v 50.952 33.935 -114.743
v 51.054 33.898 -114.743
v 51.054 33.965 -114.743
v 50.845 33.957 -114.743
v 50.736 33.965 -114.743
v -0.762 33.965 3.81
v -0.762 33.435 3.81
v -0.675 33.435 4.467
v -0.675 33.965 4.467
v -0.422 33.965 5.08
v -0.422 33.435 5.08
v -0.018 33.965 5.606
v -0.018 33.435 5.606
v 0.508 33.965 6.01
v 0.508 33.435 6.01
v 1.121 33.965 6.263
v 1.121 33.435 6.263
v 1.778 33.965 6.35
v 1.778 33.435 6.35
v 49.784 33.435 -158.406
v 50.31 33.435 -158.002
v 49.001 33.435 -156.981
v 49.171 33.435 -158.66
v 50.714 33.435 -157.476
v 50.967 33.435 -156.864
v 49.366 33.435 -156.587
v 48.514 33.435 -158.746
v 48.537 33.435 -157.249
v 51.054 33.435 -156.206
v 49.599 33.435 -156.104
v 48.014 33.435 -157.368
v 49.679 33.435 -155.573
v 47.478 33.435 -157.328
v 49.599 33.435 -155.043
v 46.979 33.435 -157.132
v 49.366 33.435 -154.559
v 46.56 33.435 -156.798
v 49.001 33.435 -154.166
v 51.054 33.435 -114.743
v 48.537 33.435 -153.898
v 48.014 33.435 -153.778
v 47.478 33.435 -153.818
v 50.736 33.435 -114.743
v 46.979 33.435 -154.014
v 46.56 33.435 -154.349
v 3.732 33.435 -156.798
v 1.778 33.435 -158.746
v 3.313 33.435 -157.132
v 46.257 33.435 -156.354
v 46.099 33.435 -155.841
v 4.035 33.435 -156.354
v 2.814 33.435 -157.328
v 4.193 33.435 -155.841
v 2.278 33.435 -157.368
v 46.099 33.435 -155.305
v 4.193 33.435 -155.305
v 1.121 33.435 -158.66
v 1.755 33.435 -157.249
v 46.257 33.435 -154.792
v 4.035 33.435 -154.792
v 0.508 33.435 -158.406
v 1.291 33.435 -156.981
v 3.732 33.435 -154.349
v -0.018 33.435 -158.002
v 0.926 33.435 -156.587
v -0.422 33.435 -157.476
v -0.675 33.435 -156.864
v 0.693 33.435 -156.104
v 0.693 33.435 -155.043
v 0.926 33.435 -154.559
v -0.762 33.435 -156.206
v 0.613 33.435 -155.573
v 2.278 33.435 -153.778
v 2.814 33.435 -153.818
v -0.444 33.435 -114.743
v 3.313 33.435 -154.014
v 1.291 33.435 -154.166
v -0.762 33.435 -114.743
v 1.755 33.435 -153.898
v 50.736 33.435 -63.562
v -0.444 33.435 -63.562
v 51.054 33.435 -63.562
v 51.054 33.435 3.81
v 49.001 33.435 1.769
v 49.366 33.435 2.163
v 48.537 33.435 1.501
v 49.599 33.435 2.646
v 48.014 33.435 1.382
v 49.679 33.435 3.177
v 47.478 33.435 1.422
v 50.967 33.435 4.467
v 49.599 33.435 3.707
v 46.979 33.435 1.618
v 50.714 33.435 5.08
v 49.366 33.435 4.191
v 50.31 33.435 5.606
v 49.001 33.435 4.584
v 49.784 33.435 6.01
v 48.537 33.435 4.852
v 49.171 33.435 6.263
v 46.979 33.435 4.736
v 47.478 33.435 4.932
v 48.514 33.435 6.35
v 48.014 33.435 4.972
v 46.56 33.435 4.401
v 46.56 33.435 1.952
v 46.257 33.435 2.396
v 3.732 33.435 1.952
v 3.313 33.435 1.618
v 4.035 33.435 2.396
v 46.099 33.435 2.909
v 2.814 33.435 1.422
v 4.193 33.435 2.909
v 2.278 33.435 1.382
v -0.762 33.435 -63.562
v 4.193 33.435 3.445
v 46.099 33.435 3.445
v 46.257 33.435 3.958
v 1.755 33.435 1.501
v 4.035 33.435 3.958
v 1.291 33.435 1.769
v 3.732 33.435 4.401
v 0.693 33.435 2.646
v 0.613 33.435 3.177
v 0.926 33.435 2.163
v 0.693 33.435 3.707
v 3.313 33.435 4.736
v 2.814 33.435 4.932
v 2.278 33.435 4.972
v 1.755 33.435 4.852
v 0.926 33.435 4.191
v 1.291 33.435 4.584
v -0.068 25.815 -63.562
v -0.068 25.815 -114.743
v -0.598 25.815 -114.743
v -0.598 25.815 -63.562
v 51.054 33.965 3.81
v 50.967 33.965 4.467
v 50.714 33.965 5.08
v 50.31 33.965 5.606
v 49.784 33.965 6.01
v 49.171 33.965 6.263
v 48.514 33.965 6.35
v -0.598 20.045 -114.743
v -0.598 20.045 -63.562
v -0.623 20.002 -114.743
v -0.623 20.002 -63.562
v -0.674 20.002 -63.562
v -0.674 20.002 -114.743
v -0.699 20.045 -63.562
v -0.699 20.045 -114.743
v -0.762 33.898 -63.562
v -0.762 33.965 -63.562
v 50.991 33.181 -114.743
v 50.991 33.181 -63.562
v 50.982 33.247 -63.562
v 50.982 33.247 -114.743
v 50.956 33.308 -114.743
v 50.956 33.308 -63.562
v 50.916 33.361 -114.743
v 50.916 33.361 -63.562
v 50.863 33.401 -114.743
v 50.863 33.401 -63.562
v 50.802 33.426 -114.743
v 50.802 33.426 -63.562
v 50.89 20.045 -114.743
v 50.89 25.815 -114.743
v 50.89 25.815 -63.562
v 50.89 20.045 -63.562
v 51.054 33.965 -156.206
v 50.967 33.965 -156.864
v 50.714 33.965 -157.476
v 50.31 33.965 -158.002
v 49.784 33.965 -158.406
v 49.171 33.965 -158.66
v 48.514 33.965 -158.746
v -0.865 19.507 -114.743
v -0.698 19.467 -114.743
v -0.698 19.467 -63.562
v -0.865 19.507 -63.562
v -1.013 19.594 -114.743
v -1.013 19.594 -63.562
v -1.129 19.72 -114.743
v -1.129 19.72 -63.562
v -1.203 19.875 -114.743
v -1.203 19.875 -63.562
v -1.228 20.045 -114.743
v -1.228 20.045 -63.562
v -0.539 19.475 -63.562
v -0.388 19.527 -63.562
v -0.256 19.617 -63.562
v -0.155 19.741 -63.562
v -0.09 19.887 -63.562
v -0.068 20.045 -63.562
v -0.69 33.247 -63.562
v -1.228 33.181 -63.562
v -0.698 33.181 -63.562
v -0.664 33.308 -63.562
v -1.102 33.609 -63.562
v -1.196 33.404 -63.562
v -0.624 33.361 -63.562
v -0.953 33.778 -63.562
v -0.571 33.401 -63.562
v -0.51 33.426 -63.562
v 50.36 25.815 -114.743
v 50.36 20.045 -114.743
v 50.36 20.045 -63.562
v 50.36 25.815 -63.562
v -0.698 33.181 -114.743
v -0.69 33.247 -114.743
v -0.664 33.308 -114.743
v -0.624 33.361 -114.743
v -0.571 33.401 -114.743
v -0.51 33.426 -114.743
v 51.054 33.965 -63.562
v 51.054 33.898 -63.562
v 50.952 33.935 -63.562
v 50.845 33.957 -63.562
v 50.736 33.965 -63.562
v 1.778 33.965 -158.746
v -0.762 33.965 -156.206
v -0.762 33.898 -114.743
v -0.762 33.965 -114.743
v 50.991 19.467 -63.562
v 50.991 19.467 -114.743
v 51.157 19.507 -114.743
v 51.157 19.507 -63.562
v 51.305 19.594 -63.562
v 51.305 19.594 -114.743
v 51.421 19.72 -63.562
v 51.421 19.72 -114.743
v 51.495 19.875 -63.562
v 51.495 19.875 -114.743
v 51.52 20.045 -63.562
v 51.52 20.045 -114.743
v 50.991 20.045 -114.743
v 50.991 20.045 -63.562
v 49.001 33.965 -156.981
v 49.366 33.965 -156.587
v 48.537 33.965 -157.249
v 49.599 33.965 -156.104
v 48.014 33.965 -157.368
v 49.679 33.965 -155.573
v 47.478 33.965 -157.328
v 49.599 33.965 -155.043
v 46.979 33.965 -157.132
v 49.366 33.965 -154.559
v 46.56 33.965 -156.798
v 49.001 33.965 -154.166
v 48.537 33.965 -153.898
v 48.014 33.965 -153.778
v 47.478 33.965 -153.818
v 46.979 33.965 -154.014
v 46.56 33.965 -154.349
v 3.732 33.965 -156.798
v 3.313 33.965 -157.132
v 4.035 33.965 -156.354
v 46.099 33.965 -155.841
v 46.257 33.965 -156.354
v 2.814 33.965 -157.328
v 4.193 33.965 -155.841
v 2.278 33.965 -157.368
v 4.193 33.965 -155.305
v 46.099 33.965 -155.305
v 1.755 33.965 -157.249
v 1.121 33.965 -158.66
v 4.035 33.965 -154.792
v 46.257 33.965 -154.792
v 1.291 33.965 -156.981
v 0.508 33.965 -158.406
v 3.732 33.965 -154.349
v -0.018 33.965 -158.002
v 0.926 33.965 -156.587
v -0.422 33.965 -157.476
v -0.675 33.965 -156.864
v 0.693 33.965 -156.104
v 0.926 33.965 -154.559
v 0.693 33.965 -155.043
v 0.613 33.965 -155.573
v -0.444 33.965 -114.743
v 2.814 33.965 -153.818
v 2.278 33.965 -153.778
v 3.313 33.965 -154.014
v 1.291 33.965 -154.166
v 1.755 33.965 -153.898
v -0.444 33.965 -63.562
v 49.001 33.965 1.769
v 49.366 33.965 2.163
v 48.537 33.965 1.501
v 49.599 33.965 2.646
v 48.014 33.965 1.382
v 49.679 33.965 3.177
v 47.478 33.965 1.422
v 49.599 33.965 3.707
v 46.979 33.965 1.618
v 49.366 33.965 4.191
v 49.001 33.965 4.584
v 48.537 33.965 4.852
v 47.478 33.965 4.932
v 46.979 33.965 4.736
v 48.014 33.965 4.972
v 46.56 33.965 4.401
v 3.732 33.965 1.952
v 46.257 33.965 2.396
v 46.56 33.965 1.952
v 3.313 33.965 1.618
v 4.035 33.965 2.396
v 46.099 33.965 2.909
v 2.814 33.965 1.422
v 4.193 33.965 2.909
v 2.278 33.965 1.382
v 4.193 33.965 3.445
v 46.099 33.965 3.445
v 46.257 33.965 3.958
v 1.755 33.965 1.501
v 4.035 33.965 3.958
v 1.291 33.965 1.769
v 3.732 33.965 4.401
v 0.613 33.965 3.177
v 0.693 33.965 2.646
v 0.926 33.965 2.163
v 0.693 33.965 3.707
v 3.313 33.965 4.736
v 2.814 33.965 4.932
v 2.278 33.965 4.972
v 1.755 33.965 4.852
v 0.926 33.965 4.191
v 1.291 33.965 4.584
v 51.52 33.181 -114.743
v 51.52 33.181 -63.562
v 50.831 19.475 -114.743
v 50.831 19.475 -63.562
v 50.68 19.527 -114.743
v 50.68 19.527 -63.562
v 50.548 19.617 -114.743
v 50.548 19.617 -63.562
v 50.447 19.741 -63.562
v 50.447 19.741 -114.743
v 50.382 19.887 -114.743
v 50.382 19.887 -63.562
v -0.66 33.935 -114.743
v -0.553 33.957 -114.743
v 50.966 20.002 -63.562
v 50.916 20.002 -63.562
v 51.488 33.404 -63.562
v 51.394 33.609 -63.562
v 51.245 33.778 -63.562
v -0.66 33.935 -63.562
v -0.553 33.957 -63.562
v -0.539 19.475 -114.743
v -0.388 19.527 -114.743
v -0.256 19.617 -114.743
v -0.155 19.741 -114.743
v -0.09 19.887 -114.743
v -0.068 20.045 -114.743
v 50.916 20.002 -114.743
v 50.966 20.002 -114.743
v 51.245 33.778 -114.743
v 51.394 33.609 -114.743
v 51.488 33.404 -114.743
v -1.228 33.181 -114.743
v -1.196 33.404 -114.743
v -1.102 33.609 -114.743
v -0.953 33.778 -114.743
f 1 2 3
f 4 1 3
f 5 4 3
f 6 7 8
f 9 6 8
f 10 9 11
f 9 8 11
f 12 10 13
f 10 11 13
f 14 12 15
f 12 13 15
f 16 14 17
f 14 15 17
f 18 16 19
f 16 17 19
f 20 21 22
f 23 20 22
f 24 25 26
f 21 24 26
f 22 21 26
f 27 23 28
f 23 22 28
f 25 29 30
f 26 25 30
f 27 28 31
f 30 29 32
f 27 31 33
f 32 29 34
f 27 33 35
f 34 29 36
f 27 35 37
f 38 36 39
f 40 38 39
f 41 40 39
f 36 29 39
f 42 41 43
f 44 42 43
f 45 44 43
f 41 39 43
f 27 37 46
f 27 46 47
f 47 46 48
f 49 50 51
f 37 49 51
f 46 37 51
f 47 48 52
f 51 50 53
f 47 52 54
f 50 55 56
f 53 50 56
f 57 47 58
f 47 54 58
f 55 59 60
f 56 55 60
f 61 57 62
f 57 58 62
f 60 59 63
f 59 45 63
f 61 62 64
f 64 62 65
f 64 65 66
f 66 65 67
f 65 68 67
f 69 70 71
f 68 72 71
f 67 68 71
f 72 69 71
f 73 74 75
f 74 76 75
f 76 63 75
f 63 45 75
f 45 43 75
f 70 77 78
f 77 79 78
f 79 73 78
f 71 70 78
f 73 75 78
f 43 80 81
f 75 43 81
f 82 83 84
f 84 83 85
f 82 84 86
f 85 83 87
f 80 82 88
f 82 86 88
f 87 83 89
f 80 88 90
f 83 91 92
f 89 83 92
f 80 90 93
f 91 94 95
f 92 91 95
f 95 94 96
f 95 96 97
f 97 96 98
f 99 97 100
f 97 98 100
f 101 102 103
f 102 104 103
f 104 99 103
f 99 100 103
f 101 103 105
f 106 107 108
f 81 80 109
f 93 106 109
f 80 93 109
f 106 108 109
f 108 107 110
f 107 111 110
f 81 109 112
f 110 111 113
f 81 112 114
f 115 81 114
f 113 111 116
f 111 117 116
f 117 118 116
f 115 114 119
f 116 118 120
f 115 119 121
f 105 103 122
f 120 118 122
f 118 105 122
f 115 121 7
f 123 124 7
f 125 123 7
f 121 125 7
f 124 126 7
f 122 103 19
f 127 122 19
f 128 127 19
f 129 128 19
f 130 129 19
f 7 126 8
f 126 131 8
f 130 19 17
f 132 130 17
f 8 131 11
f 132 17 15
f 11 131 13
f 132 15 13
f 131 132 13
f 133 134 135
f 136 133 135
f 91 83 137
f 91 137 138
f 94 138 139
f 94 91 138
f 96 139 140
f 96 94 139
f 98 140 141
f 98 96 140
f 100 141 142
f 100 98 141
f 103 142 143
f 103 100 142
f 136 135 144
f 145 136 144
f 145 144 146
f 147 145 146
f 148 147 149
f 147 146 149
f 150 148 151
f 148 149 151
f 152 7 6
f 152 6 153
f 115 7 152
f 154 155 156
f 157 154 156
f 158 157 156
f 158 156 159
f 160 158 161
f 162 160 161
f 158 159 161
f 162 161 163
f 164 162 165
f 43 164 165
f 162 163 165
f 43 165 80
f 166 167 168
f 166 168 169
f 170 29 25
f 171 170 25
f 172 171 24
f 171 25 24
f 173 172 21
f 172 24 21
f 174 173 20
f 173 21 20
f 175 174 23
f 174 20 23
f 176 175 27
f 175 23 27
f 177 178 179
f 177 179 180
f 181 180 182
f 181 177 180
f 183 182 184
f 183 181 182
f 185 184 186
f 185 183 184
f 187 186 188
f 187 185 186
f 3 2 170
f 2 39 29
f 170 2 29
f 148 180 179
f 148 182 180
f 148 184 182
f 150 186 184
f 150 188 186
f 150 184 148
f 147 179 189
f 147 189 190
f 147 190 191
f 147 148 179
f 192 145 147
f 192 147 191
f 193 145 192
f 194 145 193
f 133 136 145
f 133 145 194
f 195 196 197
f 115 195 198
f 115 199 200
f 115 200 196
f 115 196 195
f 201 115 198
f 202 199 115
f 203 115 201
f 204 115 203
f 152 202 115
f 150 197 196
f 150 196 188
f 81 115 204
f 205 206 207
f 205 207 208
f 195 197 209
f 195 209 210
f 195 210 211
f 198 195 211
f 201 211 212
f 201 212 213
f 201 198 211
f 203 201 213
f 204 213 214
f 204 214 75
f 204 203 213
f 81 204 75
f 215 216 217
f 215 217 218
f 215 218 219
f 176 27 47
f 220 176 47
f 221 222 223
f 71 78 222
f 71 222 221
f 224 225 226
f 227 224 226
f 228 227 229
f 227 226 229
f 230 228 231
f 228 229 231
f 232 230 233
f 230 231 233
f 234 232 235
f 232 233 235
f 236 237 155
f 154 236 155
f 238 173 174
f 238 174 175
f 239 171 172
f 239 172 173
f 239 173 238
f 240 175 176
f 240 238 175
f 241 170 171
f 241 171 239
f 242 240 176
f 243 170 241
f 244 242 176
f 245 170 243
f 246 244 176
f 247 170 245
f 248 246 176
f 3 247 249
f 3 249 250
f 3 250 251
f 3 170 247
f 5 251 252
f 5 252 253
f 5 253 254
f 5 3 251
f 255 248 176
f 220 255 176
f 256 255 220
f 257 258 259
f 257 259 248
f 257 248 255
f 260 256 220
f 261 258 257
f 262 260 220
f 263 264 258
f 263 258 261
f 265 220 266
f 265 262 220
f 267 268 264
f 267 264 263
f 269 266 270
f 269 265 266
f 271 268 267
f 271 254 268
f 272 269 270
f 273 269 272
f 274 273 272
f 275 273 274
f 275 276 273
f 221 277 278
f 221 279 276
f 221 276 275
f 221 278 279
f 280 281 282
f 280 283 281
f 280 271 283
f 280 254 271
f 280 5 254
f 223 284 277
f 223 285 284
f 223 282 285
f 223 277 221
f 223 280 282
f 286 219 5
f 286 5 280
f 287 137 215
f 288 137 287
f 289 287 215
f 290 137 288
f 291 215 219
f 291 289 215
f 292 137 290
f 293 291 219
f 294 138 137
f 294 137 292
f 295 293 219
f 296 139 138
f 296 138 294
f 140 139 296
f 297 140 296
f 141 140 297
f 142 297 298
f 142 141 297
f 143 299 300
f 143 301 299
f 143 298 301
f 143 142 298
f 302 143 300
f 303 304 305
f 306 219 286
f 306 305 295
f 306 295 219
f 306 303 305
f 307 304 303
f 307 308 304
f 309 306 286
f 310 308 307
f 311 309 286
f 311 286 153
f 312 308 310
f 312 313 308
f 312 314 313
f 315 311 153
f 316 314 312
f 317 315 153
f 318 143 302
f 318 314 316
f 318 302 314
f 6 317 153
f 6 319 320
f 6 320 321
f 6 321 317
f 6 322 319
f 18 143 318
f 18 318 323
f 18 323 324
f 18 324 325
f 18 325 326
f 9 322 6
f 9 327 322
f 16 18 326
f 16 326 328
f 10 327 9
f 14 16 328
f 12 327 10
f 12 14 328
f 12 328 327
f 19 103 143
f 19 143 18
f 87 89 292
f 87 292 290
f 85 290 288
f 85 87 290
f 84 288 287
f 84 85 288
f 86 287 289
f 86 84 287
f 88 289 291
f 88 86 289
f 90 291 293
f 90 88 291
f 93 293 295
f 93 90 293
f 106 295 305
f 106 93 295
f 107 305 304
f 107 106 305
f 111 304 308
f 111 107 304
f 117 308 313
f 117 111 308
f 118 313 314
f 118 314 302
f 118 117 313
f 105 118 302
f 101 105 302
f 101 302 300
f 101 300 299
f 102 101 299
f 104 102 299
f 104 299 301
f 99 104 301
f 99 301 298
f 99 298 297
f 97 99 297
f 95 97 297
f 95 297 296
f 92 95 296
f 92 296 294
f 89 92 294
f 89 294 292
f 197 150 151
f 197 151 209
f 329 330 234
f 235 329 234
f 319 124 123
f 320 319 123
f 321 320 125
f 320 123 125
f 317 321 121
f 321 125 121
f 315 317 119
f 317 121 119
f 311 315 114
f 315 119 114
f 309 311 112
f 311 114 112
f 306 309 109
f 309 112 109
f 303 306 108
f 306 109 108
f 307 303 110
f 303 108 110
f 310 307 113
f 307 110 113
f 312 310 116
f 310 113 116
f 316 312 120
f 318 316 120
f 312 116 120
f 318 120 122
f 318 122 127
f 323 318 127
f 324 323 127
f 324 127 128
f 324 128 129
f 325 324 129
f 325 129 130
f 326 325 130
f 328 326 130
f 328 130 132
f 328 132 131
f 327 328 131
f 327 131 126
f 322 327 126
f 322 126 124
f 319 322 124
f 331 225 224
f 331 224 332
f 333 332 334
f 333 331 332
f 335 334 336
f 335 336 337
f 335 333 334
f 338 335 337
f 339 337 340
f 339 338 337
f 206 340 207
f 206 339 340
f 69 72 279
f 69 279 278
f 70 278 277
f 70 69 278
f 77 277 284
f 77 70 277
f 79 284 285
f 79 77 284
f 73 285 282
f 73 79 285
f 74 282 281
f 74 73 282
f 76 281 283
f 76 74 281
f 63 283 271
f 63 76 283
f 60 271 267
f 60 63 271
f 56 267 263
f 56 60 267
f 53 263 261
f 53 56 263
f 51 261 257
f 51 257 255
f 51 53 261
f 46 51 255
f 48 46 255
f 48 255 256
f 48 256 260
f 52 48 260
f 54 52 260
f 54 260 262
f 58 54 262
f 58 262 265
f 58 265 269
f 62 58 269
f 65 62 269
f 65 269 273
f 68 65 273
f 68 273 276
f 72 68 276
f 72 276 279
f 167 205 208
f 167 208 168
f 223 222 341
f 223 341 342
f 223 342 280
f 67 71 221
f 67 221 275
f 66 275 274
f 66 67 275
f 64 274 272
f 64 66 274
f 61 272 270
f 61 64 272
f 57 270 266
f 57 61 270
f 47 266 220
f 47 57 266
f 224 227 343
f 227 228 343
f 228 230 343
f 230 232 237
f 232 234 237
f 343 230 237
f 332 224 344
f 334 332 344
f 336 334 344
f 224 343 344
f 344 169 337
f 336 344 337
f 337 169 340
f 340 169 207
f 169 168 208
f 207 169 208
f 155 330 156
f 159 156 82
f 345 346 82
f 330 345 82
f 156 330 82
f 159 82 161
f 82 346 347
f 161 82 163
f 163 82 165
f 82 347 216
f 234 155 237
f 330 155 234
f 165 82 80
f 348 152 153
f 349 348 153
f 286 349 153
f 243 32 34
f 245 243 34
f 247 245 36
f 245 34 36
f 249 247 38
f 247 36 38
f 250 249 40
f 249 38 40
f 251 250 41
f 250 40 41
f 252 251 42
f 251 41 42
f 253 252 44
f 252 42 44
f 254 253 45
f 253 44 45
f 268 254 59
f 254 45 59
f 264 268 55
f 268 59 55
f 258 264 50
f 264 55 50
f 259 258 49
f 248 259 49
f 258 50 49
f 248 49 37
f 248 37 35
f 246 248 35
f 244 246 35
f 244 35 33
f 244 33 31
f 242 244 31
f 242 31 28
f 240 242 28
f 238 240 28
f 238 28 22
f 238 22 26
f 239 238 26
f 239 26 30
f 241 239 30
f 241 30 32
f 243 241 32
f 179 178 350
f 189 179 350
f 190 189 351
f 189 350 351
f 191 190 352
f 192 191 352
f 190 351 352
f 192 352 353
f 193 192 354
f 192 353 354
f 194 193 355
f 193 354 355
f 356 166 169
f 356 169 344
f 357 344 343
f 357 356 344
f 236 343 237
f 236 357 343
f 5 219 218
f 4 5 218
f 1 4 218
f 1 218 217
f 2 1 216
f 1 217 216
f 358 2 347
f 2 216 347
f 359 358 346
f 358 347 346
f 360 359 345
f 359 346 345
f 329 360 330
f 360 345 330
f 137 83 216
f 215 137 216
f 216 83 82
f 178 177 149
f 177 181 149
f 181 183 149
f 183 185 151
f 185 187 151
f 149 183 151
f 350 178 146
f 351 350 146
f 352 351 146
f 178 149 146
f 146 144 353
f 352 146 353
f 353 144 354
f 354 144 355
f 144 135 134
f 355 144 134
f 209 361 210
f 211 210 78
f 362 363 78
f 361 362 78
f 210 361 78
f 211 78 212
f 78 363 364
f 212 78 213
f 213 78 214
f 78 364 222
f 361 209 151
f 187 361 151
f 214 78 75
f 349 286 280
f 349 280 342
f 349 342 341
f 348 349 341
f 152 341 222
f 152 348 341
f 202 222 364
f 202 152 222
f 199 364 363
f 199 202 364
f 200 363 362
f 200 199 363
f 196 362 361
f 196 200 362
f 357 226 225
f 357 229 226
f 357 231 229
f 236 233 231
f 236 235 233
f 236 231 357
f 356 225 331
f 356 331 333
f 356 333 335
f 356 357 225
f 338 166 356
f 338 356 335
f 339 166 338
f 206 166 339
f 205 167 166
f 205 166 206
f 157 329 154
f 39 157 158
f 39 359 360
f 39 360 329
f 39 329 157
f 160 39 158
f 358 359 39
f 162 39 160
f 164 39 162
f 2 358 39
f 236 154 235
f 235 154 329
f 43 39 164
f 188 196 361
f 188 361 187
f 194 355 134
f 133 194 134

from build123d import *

# Parameters (mm, degrees)
BASE_FLANGE1_DEPTH           = 0.53
M3_CLEARANCE_HOLE1_D         = 3.6
EDGE_FLANGE1_STRIP_W         = 2.6915
EDGE_FLANGE1_STRIP_H         = 0.53
EDGE_FLANGE1_STRIP_CUT_DEPTH = 51.181
EDGE_FLANGE1_DEPTH           = 51.181
HEM1_START                   = -114.74296965
HEM1_DEPTH                   = 51.181
HEM1_2_DEPTH                 = 51.181


# Read off the part's stored shape, not the designer's step: Hem1
# Sheet-metal steps are written as plain solids
with BuildPart() as part:
    # Sketch1 → Base-Flange1 (new body)
    with BuildSketch(Plane(origin=(0, 33.434923007, 0), x_dir=(1, 0, 0), z_dir=(0, 1, 0))):
        with BuildLine():
            Line((1.778, -6.350000017), (25.146, -6.350000017))
            Line((25.146, -6.350000017), (25.146, 76.198203949))
            Line((25.146, 76.198203949), (-0.762, 76.198203949))
            Line((-0.762, 76.198203949), (-0.762, -3.810000017))
            ThreePointArc((-0.762, -3.810000017), (-0.018051224, -5.606051241), (1.778, -6.350000017))
        make_face()
    extrude(amount=BASE_FLANGE1_DEPTH)

    # M3 Clearance Hole1 (through all)
    with Locations(Plane(origin=(0, 33.964923007, 0), x_dir=(1, 0, 0), z_dir=(0, 1, 0))):
        with Locations((2.413, -3.176796068)):
            Hole(M3_CLEARANCE_HOLE1_D / 2)

    # Mirror1: part across plane


with BuildPart() as part_1:
    add(part.part)
    add(part.part.mirror(Plane(origin=(-0.762, 33.964923007, -76.198203949), x_dir=(1, 0, 0), z_dir=(0, 0, 1))))

    # Edge-Flange1 strip (across the edge) → Edge-Flange1 strip cut (cut)
    with BuildSketch(Plane(origin=(-0.6985, 33.434923007, -63.56196965), x_dir=(1, 0, 0), z_dir=(0, 0, -1))):
        with Locations((-1.09175, -0.265)):
            Rectangle(EDGE_FLANGE1_STRIP_W, EDGE_FLANGE1_STRIP_H)
    extrude(amount=EDGE_FLANGE1_STRIP_CUT_DEPTH, mode=Mode.SUBTRACT)

    # Edge-Flange1 section (across the edge) → Edge-Flange1 (add)
    with BuildSketch(Plane(origin=(-0.6985, 33.434923007, -63.56196965), x_dir=(1, 0, 0), z_dir=(0, 0, -1))):
        with BuildLine():
            Line((-0.53, 0.254), (-0.53, 13.97))
            Line((-0.53, 13.97), (0, 13.97))
            Line((0, 13.97), (0, 0.254))
            ThreePointArc((0, 0.254), (0.074394878, 0.074394878), (0.254, 0))
            Line((0.254, 0), (0.254, -0.53))
            ThreePointArc((0.254, -0.53), (-0.300371716, -0.300371716), (-0.53, 0.254))
        make_face()
    extrude(amount=EDGE_FLANGE1_DEPTH)

    # Hem1 outline → Hem1 (cut)
    with BuildSketch(Plane.XY.offset(HEM1_START)):
        with BuildLine():
            Line((-0.6985, 19.464923007), (-0.6985, 19.467082198))
            ThreePointArc((-0.6985, 19.467082198), (-1.075934205, 19.652877091), (-1.2285, 20.044923007))
            Line((-1.2285, 20.044923007), (-1.2285, 19.464923007))
            Line((-1.2285, 19.464923007), (-0.6985, 19.464923007))
        make_face()
    extrude(amount=HEM1_DEPTH, mode=Mode.SUBTRACT)

    # Hem1 2 outline → Hem1 2 (add)
    with BuildSketch(Plane.XY.offset(HEM1_START)):
        with BuildLine():
            Line((-0.0685, 25.814923007), (-0.5985, 25.814923007))
            Line((-0.5985, 25.814923007), (-0.5985, 20.044923007))
            ThreePointArc((-0.5985, 20.044923007), (-0.6485, 19.994923007), (-0.6985, 20.044923007))
            Line((-0.6985, 20.044923007), (-0.6985, 19.467082198))
            ThreePointArc((-0.6985, 19.467082198), (-0.256454084, 19.617488802), (-0.0685, 20.044923007))
            Line((-0.0685, 20.044923007), (-0.0685, 25.814923007))
        make_face()
    extrude(amount=HEM1_2_DEPTH)

    # Mirror2: part across face


with BuildPart() as part_2:
    add(part_1.part)
    add(part_1.part.mirror(Plane(origin=(25.146, 33.699923007, -76.198203949), x_dir=(0, 0, 1), z_dir=(1, 0, 0))))


solid = part_2.part
